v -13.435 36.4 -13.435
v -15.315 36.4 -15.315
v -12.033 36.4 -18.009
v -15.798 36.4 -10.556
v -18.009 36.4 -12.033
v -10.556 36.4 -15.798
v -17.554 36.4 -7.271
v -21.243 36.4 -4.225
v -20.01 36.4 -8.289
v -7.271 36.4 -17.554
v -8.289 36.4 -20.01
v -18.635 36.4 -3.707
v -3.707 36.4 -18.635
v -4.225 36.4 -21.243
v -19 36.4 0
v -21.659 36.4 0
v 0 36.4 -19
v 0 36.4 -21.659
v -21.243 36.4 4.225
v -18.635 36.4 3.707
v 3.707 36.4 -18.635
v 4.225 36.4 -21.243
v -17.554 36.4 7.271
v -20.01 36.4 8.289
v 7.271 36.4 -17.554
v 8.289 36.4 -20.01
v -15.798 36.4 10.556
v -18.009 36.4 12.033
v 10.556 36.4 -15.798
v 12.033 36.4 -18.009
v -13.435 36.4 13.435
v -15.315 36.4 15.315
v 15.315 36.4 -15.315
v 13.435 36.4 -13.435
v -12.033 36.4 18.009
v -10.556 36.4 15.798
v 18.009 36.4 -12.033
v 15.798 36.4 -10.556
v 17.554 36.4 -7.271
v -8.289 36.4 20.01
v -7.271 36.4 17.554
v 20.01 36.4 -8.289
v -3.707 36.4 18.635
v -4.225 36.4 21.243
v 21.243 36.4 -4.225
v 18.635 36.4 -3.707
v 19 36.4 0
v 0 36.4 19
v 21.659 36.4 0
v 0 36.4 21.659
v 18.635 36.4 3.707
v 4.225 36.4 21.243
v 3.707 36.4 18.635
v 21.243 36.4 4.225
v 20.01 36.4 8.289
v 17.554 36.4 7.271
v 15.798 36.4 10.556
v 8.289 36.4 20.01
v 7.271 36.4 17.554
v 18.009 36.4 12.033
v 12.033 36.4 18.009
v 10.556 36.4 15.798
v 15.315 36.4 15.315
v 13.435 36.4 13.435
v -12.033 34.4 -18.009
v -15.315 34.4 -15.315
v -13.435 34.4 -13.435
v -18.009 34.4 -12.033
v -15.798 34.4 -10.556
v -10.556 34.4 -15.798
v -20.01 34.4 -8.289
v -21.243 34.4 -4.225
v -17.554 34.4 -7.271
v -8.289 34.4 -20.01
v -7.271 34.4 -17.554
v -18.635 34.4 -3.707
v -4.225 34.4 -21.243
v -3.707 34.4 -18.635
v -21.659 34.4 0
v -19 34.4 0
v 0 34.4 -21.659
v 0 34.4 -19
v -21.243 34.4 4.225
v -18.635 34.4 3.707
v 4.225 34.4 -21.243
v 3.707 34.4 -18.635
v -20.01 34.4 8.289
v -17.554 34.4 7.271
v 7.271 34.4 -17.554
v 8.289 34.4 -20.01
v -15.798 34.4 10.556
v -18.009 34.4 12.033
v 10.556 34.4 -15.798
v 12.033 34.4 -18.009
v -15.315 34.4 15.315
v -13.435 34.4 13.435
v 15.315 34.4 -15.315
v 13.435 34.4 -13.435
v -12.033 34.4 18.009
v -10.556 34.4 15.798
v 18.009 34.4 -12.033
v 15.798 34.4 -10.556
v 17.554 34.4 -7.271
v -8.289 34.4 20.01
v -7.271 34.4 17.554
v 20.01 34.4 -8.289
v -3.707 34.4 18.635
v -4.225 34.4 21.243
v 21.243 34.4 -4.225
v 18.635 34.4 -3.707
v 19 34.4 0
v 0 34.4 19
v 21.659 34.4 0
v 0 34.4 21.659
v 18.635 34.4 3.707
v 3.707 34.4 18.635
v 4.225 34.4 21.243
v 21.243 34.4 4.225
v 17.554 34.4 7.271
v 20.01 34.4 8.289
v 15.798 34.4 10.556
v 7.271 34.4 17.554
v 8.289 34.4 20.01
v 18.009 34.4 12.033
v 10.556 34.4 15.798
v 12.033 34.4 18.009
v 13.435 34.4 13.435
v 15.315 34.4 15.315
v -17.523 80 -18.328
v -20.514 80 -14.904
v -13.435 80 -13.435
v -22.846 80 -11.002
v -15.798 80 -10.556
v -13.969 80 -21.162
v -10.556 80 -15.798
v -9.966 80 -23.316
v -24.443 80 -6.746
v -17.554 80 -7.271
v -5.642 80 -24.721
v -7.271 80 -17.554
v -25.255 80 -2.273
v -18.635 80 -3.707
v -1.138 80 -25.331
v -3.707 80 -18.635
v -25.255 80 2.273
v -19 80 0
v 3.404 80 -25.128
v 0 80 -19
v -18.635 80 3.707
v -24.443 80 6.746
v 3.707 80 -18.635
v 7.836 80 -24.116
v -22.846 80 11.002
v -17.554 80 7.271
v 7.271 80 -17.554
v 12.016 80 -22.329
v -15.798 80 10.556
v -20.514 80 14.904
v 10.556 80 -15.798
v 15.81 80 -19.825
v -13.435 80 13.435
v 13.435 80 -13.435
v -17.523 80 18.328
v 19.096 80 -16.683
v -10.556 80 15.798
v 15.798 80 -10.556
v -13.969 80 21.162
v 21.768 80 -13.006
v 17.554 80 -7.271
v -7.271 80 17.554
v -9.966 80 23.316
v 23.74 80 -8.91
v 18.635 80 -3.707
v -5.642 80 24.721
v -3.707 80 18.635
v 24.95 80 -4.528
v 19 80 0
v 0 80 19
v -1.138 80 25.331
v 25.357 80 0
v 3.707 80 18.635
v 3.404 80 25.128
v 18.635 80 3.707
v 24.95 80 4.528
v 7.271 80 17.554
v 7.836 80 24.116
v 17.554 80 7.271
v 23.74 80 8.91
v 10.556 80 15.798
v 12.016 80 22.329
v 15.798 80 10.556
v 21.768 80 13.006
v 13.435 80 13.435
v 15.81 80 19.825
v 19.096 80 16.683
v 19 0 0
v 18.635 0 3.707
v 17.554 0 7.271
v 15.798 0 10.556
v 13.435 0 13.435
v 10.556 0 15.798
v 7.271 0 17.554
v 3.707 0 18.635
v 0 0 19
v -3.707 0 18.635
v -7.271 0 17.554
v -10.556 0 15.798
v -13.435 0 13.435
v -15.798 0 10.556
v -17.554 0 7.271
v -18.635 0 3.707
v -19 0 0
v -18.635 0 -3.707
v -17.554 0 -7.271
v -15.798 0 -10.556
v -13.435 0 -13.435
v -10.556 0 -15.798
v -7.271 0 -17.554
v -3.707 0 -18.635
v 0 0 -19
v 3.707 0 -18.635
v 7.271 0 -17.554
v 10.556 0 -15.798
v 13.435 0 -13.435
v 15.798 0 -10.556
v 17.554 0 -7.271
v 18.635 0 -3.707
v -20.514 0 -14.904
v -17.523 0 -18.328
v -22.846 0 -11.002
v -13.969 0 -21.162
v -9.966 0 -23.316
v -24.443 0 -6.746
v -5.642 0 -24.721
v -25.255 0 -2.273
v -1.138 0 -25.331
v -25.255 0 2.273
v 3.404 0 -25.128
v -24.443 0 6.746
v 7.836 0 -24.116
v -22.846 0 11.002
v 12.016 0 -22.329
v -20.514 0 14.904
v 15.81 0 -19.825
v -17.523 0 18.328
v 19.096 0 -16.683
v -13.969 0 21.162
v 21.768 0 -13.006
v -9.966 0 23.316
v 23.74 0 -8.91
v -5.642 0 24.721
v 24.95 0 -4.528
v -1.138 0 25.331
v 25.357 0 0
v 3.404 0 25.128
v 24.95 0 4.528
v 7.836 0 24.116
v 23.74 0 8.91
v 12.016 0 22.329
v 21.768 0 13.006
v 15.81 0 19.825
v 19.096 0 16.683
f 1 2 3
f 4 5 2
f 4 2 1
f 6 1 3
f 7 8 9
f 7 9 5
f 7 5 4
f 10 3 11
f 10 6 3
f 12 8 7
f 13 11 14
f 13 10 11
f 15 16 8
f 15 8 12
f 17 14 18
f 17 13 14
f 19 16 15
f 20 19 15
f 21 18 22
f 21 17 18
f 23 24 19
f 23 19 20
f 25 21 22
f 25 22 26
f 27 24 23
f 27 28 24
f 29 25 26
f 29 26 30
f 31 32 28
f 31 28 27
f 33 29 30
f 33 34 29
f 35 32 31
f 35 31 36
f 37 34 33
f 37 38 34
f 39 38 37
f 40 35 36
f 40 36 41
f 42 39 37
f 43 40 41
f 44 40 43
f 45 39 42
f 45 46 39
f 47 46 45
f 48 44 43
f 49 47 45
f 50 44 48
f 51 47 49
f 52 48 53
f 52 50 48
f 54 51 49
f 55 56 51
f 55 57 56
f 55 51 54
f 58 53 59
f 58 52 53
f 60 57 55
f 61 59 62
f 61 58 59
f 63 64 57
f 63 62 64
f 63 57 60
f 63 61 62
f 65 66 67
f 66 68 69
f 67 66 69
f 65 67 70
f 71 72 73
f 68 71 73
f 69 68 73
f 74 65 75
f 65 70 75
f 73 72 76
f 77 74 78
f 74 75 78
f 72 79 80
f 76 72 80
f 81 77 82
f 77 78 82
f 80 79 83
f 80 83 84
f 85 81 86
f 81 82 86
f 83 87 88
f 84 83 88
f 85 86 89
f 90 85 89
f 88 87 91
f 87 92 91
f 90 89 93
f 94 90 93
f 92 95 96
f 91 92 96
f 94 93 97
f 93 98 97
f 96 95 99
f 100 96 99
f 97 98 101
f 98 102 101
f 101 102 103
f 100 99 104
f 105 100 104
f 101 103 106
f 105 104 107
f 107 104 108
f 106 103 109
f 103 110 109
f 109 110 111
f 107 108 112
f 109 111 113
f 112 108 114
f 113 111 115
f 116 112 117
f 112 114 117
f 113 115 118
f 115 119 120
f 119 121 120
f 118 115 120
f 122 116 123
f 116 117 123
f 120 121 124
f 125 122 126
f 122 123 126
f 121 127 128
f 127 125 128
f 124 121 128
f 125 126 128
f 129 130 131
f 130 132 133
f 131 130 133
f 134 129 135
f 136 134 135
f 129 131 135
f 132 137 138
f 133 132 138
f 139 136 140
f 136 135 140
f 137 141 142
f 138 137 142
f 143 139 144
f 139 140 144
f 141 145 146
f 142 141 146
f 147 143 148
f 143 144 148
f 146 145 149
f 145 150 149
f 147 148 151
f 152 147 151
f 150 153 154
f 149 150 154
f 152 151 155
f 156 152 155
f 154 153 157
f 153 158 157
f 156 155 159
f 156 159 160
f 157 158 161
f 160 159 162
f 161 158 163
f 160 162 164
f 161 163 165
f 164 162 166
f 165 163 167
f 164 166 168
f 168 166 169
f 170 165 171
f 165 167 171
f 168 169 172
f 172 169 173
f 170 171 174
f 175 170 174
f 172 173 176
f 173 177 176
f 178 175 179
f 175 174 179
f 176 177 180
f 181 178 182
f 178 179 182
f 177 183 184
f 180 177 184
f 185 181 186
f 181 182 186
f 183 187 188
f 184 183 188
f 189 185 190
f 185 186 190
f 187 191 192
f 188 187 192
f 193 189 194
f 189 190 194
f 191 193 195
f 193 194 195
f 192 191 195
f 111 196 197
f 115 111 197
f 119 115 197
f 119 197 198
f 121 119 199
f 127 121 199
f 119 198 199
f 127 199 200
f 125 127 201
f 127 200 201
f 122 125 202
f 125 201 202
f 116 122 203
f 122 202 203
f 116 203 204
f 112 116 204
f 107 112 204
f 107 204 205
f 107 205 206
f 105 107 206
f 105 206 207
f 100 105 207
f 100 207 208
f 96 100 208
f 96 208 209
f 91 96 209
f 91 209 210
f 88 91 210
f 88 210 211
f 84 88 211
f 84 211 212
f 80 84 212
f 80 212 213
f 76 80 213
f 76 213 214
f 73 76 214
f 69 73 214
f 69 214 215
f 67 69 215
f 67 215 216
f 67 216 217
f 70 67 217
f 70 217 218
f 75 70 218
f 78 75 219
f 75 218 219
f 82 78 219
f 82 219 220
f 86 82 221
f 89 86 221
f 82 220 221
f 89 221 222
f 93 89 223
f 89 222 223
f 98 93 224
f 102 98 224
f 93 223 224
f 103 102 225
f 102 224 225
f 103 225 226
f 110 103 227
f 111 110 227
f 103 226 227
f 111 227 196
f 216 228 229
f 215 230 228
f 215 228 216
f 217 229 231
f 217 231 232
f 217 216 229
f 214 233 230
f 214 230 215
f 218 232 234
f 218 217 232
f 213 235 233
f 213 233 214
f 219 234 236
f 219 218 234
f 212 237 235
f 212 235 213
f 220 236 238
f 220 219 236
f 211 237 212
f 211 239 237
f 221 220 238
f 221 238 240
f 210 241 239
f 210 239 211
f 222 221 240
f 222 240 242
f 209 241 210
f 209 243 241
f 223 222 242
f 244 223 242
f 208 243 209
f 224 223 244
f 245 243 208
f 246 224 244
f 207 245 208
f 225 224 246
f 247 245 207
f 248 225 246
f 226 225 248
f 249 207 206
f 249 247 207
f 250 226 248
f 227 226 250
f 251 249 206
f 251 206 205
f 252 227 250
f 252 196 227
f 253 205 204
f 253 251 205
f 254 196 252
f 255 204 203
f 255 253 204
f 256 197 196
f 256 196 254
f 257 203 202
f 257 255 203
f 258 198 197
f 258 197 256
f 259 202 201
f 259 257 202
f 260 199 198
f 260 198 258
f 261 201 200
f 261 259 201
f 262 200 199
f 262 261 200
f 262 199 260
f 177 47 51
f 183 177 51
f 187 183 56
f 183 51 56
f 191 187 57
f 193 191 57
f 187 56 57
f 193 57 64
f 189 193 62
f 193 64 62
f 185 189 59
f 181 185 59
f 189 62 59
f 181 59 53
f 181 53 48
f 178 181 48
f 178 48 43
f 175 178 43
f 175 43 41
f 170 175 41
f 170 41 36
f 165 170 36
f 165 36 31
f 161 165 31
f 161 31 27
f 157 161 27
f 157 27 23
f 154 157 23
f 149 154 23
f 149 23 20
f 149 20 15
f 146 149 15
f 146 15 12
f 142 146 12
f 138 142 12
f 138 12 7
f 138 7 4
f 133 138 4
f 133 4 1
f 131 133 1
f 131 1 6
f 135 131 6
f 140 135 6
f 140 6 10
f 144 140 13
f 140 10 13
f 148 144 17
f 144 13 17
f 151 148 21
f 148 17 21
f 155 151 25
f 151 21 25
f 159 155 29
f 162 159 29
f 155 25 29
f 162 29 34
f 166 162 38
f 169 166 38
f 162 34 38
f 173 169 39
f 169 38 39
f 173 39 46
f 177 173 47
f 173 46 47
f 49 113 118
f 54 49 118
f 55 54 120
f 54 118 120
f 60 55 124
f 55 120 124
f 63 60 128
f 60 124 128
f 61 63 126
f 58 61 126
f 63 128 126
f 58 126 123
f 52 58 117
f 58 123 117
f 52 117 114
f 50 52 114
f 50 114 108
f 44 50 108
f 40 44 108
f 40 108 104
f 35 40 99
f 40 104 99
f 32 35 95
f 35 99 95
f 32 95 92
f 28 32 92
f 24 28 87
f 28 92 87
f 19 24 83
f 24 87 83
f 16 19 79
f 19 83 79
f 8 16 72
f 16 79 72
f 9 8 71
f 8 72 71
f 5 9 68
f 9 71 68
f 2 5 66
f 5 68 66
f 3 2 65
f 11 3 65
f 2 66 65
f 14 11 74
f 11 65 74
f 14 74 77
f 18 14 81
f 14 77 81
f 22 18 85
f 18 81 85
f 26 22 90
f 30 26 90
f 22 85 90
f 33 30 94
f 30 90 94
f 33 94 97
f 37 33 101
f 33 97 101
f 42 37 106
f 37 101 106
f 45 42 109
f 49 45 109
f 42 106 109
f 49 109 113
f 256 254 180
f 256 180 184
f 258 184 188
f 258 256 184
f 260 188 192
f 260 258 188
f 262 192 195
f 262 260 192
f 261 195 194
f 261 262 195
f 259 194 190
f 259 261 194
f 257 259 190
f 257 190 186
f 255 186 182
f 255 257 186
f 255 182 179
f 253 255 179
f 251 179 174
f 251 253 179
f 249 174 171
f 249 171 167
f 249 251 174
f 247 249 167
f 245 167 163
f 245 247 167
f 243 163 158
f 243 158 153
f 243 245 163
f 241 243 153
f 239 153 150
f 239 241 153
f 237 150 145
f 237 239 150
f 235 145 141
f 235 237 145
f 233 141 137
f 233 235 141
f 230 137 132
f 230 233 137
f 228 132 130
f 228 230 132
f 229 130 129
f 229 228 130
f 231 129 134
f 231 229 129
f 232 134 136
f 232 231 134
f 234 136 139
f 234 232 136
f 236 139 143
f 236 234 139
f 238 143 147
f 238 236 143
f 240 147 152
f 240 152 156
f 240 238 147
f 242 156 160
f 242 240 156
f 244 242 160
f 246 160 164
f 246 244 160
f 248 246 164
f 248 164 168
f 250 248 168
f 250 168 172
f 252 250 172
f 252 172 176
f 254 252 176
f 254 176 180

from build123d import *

# Parameters (mm, degrees)
F0_R     = 25.357029
F1_DEPTH = 80
F2_R     = 19
F3_DEPTH = 99.8
F5_R     = 21.659123
F6_DEPTH = 2


with BuildPart() as f1:
    # F0 (on Front) → F1 (new body)
    with BuildSketch(Plane.XZ):
        Circle(F0_R)
    extrude(amount=-F1_DEPTH)

    # F2 (on face) → F3 (cut)
    with BuildSketch(Plane.XZ):
        Circle(F2_R)
    extrude(amount=-F3_DEPTH, mode=Mode.SUBTRACT)

    # F5 (on offset) → F6 (cut)
    with BuildSketch(Plane.XZ.offset(-34.4)):
        Circle(F5_R)
    extrude(amount=-F6_DEPTH, mode=Mode.SUBTRACT)


solid = f1.part
